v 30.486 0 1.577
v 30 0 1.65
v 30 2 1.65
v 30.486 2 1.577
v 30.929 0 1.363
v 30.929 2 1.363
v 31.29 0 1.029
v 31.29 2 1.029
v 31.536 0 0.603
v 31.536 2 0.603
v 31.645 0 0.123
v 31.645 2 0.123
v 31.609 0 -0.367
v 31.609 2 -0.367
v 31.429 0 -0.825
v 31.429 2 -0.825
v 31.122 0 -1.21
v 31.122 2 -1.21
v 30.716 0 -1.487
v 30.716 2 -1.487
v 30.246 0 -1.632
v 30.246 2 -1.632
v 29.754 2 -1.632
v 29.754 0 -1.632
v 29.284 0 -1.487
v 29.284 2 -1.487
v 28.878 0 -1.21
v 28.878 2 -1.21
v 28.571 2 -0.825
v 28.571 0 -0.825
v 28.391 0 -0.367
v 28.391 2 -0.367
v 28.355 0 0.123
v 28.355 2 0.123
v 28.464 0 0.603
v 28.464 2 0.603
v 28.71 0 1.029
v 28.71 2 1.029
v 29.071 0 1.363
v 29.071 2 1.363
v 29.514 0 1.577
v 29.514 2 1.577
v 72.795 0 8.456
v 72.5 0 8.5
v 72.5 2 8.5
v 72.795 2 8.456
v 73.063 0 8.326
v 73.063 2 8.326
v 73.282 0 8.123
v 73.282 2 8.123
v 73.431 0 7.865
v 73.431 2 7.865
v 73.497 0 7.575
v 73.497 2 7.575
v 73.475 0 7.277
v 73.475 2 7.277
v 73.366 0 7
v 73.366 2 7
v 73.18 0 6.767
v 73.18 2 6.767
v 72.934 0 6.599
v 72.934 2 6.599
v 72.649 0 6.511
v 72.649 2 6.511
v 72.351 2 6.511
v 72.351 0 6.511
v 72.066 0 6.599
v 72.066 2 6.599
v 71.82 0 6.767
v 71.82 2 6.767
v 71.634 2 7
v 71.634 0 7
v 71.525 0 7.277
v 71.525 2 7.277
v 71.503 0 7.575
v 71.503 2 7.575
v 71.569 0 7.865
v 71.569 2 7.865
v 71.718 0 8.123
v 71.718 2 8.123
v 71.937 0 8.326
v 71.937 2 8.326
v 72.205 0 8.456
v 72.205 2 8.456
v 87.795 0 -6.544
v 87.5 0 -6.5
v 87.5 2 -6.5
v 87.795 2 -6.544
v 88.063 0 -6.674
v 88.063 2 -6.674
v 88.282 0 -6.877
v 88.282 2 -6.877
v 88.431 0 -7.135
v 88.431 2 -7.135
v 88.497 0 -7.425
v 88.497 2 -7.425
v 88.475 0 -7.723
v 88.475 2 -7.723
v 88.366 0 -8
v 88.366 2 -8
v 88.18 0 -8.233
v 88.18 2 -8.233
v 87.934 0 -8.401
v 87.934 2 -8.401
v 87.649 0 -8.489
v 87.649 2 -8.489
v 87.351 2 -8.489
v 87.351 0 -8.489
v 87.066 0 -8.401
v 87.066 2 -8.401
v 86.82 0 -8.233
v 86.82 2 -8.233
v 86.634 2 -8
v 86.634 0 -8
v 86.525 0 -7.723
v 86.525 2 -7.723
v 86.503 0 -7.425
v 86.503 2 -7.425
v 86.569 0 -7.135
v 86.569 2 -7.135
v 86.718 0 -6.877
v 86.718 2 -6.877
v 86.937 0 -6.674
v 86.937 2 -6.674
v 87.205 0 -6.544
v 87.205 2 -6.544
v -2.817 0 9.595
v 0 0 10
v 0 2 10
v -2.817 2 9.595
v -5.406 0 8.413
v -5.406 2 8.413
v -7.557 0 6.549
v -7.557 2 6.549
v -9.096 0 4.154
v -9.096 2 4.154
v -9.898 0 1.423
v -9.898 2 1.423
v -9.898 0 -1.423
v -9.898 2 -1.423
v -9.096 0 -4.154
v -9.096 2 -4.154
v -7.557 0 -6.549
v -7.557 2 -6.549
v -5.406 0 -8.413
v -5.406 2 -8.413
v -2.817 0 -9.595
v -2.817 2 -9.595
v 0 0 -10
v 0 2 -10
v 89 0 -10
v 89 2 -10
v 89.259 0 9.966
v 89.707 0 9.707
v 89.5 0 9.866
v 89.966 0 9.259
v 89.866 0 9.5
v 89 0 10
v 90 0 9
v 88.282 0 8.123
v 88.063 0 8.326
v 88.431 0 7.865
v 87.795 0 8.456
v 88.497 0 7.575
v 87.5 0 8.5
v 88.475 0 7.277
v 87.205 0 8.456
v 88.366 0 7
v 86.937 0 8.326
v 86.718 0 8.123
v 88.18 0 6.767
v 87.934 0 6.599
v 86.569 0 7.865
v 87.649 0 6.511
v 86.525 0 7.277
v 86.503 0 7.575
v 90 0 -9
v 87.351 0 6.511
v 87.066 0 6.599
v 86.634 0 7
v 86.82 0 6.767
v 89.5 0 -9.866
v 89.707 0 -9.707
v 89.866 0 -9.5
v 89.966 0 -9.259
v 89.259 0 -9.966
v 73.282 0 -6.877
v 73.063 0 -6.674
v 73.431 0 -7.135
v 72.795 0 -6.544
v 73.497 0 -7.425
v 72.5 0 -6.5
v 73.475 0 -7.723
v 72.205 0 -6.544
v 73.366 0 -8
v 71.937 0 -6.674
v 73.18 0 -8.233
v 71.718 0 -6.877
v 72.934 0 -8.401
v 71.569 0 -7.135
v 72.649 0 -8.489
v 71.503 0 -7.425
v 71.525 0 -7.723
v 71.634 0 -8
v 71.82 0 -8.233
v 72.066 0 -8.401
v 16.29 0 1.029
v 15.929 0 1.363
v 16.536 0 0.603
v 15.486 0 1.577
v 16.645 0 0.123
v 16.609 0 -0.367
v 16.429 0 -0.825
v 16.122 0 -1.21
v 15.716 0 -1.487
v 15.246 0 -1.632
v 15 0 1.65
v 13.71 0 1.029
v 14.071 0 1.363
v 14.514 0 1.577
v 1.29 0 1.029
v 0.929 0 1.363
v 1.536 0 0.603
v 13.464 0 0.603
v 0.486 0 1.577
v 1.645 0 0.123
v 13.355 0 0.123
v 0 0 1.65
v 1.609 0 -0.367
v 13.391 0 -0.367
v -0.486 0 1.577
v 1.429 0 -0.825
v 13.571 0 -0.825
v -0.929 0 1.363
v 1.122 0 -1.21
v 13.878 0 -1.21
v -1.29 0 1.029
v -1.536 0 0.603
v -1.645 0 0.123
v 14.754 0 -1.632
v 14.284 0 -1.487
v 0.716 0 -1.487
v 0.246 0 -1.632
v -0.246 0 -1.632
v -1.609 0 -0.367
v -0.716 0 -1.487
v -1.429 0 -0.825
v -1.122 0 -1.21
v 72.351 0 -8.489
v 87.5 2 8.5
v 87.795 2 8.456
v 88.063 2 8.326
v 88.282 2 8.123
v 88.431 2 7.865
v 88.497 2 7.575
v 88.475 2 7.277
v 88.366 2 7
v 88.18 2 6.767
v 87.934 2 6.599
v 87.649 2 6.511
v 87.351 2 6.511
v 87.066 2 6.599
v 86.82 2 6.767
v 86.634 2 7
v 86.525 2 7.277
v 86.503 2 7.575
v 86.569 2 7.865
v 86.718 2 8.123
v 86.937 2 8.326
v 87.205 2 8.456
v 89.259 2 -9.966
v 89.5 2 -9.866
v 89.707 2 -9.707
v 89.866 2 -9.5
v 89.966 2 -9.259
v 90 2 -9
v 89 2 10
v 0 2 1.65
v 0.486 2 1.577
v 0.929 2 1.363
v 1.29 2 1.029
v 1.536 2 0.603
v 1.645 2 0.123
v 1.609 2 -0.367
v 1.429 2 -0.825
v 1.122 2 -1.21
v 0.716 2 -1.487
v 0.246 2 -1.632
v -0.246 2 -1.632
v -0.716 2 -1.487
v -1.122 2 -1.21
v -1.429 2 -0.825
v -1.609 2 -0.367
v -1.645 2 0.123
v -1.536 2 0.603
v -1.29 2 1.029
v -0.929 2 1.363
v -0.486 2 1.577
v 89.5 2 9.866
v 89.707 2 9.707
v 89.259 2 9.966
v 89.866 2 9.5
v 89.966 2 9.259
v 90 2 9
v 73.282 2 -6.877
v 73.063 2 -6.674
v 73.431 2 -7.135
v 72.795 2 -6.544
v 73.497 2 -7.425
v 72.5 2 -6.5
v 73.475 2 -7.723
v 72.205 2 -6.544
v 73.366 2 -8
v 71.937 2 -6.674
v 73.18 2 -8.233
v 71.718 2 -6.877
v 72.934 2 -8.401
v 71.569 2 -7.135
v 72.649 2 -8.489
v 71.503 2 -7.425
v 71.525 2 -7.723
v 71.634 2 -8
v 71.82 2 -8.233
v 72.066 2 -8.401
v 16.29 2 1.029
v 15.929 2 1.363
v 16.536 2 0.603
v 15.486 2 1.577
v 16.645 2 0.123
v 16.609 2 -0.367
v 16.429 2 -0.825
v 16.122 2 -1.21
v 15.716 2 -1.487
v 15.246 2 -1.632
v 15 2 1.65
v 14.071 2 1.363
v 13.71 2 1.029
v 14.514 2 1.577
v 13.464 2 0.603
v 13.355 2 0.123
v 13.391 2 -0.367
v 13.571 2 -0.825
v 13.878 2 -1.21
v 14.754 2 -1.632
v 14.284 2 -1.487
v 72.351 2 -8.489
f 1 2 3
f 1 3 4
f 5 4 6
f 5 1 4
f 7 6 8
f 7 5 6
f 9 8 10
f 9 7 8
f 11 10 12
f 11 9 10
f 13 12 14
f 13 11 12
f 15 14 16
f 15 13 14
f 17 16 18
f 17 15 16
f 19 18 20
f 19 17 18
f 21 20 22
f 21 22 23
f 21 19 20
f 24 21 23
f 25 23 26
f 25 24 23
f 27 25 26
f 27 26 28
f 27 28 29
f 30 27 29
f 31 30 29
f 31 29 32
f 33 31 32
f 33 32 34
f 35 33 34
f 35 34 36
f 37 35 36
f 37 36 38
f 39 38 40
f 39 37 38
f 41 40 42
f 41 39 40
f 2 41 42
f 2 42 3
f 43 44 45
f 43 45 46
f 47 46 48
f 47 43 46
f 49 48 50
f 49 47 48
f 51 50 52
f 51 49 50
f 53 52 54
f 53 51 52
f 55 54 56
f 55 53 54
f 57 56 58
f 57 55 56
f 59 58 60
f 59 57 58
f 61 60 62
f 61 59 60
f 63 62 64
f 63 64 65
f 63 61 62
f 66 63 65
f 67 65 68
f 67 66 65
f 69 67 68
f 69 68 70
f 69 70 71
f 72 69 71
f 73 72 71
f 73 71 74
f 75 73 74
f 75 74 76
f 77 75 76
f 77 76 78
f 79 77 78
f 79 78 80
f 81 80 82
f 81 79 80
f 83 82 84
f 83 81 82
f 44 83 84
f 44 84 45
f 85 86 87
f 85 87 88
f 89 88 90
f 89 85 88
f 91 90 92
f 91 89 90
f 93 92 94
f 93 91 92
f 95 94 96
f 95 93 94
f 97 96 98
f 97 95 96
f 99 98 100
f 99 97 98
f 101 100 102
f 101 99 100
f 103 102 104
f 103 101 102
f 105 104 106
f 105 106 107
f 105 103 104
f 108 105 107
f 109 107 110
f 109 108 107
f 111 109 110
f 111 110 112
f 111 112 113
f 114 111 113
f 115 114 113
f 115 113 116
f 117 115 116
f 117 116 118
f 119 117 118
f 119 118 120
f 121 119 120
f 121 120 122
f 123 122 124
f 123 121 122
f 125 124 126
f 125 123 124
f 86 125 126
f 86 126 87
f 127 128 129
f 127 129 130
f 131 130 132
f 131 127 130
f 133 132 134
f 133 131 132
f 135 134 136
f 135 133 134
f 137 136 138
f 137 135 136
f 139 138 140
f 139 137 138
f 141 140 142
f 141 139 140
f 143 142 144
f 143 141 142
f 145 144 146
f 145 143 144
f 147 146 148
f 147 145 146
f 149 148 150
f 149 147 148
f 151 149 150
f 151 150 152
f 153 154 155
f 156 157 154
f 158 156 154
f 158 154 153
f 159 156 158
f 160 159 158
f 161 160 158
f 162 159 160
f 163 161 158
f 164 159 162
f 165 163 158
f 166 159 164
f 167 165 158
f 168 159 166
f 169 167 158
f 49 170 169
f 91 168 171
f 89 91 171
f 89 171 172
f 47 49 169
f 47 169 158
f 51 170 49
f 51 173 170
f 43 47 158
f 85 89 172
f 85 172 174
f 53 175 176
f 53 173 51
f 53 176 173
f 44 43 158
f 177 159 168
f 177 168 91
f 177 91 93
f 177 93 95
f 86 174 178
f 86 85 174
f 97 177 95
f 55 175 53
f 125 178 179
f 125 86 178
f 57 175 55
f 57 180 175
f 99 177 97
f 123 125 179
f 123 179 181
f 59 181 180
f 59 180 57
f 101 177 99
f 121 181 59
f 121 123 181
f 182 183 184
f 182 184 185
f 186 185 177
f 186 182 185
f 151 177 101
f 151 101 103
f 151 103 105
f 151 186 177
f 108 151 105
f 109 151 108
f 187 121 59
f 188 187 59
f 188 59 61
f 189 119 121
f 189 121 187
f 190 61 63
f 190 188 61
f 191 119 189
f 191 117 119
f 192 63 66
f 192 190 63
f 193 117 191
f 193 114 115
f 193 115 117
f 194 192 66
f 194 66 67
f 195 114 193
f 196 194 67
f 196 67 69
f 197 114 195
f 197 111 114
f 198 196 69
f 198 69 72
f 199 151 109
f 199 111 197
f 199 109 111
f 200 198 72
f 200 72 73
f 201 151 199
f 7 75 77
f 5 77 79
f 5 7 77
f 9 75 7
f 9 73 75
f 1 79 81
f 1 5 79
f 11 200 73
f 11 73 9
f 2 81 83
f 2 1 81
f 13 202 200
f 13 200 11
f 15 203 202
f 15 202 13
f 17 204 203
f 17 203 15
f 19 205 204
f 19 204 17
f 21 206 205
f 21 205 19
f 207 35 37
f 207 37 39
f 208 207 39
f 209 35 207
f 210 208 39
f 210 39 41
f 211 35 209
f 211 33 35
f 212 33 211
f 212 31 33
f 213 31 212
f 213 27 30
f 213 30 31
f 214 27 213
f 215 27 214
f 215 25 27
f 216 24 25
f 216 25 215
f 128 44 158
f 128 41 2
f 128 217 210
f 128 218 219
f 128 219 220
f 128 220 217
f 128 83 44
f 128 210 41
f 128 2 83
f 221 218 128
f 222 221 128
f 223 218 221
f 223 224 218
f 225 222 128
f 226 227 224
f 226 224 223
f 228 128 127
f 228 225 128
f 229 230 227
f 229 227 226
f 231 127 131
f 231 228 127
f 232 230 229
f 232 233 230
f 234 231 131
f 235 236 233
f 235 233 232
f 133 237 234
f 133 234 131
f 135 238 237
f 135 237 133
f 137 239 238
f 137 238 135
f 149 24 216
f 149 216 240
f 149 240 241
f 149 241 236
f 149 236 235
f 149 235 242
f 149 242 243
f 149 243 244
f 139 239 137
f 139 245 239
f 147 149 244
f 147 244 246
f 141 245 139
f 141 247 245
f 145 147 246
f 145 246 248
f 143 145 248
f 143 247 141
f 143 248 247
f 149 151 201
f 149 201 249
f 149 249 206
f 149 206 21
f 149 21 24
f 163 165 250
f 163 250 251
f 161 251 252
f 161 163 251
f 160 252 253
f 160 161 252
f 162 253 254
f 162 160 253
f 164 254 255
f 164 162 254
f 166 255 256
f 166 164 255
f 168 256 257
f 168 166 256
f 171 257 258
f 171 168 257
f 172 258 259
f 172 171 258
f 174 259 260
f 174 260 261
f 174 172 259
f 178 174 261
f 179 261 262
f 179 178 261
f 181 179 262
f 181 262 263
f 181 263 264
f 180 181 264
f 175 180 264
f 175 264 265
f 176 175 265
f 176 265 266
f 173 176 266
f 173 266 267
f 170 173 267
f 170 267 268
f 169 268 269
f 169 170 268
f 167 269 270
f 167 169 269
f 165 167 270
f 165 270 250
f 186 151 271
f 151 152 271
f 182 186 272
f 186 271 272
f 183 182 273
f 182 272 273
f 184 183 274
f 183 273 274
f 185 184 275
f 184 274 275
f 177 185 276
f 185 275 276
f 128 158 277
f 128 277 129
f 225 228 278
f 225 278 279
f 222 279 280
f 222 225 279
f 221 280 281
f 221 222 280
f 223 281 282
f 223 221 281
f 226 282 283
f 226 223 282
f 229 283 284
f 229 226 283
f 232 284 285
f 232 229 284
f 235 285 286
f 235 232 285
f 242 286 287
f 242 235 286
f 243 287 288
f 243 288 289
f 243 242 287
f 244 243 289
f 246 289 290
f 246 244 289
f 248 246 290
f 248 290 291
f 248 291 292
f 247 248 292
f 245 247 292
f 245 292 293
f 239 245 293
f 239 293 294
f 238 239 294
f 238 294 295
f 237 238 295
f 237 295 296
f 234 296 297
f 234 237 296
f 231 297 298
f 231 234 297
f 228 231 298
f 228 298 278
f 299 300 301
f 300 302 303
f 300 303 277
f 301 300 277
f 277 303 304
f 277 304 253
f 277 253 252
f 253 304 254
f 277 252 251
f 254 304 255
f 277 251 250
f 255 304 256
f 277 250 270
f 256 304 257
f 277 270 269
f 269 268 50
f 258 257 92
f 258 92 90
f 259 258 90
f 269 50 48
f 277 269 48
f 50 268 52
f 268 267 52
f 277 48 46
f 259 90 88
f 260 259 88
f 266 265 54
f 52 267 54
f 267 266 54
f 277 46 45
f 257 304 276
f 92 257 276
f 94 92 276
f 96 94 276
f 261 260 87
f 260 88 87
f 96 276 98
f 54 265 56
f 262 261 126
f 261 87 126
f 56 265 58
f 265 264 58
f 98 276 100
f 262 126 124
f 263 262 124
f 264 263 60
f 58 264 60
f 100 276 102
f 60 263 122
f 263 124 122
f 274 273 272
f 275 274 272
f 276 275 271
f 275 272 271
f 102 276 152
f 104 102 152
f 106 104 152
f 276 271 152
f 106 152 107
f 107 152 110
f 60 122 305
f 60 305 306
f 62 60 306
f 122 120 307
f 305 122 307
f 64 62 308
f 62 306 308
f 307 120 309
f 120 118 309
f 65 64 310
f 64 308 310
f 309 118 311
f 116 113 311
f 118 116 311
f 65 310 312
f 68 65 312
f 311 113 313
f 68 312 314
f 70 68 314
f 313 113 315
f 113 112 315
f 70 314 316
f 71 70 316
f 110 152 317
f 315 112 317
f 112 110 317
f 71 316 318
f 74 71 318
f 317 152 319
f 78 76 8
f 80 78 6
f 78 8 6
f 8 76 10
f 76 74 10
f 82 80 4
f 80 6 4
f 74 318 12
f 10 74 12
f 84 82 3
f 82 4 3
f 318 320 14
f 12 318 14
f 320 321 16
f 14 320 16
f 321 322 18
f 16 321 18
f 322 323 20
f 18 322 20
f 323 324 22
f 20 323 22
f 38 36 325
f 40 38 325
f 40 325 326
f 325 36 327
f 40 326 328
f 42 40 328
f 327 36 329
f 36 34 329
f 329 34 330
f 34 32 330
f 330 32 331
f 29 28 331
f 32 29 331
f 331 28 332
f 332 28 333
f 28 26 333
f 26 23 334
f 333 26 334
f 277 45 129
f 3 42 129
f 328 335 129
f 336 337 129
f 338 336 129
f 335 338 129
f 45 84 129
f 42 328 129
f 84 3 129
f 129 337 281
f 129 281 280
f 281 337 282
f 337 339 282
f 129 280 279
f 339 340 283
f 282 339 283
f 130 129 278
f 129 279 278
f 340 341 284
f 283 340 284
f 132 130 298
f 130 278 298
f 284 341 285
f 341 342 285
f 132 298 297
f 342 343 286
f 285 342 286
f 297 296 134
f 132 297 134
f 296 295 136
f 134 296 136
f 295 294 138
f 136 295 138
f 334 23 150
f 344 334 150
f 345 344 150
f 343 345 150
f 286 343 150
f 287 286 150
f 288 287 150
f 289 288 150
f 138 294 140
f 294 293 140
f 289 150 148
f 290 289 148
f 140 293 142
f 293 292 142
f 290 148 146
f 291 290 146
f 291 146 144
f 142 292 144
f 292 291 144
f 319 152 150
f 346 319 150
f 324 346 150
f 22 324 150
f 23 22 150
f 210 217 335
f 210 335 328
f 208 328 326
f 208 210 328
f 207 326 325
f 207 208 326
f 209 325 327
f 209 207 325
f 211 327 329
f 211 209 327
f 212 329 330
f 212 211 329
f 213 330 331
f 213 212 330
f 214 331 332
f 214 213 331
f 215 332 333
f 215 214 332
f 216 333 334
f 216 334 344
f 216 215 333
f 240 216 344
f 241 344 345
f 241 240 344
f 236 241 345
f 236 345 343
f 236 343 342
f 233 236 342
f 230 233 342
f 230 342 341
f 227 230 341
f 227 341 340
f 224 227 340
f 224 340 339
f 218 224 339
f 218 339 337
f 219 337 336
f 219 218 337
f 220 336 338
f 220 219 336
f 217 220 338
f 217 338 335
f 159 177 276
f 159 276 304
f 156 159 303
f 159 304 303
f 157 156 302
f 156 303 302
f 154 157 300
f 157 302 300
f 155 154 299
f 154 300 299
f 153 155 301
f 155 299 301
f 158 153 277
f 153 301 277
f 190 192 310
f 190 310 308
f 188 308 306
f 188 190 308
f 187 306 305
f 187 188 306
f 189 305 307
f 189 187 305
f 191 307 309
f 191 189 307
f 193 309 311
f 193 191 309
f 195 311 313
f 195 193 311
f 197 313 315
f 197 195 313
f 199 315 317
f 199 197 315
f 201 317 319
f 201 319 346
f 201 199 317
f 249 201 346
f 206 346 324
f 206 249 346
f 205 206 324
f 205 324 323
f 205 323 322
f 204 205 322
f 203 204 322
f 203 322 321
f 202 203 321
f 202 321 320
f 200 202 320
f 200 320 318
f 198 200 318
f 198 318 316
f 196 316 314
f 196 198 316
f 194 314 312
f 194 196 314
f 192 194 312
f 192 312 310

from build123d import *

# Parameters (mm, degrees)
SKETCH_1_R      = 1.65
SKETCH_1_R_2    = 1
EXTRUDE_1_DEPTH = 2
FILLET_1_R      = 1


with BuildPart() as part:
    # Эскиз1 → Бобышка-Вытянуть1 (new body)
    with BuildSketch(Plane(origin=(0, 0, 0), x_dir=(1, 0, 0), z_dir=(0, 1, 0))):
        with BuildLine():
            Line((0, 10), (90, 10))
            Line((90, 10), (90, -10))
            Line((90, -10), (0, -10))
            ThreePointArc((0, -10), (-10, 0), (0, 10))
        make_face()
        with Locations(Location((30, 0, 0), (0, 0, 270))):
            Circle(SKETCH_1_R, mode=Mode.SUBTRACT)
        with Locations(Location((0, 0, 0), (0, 0, 270))):
            Circle(SKETCH_1_R, mode=Mode.SUBTRACT)
        with Locations(Location((15, 0, 0), (0, 0, 270))):
            Circle(SKETCH_1_R, mode=Mode.SUBTRACT)
        with Locations(Location((87.5, 7.5, 0), (0, 0, 270))):
            Circle(SKETCH_1_R_2, mode=Mode.SUBTRACT)
        with Locations(Location((72.5, 7.5, 0), (0, 0, 270))):
            Circle(SKETCH_1_R_2, mode=Mode.SUBTRACT)
        with Locations(Location((87.5, -7.5, 0), (0, 0, 270))):
            Circle(SKETCH_1_R_2, mode=Mode.SUBTRACT)
        with Locations(Location((72.5, -7.5, 0), (0, 0, 270))):
            Circle(SKETCH_1_R_2, mode=Mode.SUBTRACT)
    extrude(amount=EXTRUDE_1_DEPTH)

    # Скругление1
    fillet_1_edges = [part.edges().sort_by_distance(p)[0] for p in [
        (90, 1, -10),
        (90, 1, 10),
    ]]
    fillet(fillet_1_edges, radius=FILLET_1_R)


solid = part.part
